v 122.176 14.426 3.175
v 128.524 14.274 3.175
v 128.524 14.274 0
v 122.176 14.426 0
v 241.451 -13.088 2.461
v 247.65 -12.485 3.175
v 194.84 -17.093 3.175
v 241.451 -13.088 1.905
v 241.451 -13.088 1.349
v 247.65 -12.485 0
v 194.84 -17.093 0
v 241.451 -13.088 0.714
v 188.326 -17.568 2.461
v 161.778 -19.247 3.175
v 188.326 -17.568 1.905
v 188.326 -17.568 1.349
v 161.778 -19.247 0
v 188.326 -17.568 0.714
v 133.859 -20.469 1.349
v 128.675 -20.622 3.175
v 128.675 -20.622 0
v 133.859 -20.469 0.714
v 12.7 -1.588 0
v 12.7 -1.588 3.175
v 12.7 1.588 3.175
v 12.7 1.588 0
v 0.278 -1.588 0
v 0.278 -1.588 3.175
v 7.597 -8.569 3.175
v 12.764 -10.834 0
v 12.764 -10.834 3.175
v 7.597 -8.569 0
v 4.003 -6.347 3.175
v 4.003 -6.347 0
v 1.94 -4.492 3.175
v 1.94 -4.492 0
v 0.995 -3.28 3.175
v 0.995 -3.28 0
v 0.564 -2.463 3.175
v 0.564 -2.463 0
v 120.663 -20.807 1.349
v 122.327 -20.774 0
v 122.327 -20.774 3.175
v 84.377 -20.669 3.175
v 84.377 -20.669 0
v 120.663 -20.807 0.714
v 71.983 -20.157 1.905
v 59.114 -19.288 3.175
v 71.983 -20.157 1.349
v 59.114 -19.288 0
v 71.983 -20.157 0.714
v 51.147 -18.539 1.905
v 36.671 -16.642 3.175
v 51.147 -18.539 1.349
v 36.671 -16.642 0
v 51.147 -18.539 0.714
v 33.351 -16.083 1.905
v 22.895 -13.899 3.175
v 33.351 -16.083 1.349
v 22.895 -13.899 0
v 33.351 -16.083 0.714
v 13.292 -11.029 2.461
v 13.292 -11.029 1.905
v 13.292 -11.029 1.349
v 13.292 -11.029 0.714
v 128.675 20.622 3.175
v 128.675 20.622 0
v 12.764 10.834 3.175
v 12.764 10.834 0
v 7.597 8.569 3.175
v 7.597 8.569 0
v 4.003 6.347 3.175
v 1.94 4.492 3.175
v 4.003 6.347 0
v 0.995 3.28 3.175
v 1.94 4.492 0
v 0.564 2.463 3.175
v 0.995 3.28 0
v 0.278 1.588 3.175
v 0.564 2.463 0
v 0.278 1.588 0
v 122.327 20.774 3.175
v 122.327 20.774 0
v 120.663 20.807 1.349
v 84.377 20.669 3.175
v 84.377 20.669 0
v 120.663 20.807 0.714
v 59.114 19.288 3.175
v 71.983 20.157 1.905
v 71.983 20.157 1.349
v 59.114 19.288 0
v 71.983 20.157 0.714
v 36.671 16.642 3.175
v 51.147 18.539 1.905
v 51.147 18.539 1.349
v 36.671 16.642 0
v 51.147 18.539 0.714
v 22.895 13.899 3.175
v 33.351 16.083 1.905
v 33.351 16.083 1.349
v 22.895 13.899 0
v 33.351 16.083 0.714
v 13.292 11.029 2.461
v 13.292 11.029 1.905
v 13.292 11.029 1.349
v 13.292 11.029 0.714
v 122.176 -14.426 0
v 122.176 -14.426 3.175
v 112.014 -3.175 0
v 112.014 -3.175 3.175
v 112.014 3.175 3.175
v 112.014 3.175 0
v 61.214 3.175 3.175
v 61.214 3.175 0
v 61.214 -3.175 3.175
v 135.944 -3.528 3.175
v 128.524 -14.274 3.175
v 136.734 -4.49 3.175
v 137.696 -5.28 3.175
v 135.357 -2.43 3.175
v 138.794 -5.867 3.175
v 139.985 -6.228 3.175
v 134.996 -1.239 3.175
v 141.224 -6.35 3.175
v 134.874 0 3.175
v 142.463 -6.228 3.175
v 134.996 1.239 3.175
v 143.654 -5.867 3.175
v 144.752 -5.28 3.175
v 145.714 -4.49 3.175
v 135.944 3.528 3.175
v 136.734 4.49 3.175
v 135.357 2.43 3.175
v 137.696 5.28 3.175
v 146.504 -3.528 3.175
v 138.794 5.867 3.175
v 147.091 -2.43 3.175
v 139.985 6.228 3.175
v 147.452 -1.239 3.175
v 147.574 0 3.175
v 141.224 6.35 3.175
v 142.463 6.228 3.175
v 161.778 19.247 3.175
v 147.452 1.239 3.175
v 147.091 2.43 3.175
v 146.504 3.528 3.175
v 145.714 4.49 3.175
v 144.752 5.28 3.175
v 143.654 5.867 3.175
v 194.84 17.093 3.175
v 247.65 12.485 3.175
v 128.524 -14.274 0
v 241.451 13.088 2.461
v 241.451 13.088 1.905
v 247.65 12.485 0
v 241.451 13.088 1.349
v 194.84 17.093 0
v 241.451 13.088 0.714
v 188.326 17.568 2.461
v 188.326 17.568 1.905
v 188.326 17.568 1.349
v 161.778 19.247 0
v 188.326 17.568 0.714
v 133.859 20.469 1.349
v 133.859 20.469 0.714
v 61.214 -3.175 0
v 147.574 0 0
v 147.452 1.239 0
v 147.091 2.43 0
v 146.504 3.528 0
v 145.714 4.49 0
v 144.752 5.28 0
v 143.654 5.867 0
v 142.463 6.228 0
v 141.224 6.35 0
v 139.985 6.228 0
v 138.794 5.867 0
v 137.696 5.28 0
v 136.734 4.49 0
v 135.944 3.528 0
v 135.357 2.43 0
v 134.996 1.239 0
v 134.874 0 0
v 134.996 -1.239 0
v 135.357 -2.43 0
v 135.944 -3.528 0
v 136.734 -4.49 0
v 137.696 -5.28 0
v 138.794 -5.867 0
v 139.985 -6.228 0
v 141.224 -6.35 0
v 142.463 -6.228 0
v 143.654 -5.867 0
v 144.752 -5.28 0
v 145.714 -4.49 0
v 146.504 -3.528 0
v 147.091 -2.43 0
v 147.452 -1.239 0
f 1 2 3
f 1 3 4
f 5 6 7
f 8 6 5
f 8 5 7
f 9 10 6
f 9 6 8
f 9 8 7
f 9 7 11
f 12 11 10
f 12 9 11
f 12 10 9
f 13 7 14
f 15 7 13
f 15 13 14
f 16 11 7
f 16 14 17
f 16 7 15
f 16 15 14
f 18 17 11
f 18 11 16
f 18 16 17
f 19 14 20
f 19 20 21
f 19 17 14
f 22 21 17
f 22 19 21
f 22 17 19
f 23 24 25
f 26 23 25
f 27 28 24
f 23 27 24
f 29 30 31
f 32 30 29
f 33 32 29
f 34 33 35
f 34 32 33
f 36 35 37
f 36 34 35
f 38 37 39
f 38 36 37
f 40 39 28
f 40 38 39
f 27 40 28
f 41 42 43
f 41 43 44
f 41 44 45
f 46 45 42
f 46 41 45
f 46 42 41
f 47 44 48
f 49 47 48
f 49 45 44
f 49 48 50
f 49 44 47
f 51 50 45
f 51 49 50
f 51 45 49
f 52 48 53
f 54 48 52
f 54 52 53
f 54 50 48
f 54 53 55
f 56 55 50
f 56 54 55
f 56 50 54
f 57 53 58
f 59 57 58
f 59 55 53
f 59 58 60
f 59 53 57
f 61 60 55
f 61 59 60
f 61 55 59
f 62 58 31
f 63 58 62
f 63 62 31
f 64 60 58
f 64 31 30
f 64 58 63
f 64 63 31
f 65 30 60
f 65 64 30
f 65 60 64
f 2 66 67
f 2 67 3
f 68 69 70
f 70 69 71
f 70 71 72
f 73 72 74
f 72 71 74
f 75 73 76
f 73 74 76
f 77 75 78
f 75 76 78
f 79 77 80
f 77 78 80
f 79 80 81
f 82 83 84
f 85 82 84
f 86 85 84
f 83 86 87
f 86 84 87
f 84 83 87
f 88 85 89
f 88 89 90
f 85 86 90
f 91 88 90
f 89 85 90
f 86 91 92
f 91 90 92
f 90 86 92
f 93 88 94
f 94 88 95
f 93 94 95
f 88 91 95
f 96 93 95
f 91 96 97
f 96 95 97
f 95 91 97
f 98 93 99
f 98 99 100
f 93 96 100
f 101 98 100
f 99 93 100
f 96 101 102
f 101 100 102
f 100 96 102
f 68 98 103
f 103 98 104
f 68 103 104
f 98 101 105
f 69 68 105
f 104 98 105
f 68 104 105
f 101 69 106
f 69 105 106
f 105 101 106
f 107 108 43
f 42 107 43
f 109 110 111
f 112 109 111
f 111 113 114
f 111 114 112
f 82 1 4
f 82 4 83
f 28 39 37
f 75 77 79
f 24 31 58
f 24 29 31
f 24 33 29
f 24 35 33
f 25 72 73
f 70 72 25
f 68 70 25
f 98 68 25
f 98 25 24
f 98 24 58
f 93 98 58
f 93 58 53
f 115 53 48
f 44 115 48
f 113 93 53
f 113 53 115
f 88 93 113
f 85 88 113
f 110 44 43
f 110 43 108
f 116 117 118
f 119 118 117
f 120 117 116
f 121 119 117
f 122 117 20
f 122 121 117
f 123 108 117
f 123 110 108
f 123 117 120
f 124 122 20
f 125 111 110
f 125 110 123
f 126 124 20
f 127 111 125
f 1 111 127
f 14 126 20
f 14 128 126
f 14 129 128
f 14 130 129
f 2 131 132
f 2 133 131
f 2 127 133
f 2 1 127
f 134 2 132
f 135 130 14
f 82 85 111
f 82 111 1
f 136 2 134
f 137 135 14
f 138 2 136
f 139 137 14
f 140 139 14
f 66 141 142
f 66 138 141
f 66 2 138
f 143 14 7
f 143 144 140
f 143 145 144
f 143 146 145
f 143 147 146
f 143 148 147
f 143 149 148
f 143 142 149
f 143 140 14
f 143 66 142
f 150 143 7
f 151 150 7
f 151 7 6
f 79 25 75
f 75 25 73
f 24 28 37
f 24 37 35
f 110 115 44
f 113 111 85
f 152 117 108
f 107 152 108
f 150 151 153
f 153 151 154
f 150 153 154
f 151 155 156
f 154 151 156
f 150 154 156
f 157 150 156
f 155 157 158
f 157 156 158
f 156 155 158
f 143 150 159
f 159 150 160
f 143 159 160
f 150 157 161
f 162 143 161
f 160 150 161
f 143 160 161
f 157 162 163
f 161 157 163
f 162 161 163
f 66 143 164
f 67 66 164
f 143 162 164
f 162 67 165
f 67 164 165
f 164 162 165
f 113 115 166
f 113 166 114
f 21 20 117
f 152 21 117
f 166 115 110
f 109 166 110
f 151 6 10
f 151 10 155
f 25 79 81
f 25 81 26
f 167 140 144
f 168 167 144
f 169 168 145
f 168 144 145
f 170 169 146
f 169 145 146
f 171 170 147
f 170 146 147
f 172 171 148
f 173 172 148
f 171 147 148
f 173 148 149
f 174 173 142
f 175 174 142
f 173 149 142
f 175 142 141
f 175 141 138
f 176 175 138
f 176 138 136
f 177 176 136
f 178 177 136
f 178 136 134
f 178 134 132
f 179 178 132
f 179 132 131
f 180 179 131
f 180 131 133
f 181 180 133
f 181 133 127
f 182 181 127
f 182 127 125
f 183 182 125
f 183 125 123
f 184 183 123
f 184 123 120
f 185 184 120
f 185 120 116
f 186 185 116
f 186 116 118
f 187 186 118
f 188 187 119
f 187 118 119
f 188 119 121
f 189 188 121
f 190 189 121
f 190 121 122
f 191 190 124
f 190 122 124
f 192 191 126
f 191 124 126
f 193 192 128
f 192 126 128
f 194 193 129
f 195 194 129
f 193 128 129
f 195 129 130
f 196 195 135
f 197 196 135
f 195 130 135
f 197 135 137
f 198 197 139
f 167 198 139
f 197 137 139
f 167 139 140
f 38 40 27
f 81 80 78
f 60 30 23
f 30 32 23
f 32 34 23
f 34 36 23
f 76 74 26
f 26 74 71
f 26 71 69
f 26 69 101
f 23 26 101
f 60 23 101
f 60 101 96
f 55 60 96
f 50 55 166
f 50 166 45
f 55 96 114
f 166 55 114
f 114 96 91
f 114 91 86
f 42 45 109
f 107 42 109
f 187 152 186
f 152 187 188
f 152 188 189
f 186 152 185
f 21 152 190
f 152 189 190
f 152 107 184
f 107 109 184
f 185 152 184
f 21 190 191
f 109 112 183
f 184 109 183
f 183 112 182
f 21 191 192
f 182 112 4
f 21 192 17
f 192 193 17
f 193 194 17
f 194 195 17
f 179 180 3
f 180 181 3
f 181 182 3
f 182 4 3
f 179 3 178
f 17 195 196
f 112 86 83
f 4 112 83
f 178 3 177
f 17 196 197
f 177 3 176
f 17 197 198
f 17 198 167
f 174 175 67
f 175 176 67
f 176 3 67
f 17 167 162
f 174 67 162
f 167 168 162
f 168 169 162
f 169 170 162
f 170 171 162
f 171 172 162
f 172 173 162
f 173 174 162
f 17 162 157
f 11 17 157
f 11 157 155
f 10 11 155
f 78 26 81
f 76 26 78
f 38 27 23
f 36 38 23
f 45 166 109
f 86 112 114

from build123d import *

# Parameters (mm, degrees)
BOSS_EXTRUDE1_DEPTH = 3.175
SKETCH3_R           = 6.35
SKETCH3_W           = 101.6
SKETCH3_H           = 101.6
SKETCH3_W_2         = 12.7
SKETCH3_H_2         = 3.175
CUT_EXTRUDE1_DEPTH  = 5.08
SKETCH4_W           = 50.8
SKETCH4_H           = 6.35
CUT_EXTRUDE2_DEPTH  = 5.08


with BuildPart() as part:
    # Sketch2 → Boss-Extrude1 (new body)
    with BuildSketch(Plane.XY):
        with BuildLine():
            add(Edge.make_bspline(
                [(349.25, 0), (349.081845346, 0.195028946), (348.546486748, 0.815947966), (346.670763268, 0.635287815), (344.11086643, 1.231330826), (340.348873806, 1.640765335), (335.631665172, 2.319189902), (329.896669995, 3.064968776), (323.213152208, 3.937751592), (315.610665982, 4.899637326), (307.139892382, 5.94572983), (297.851820227, 7.058039906), (287.804163994, 8.223966301), (277.05860736, 9.42727111), (265.681494766, 10.653371923), (253.743033604, 11.887008331), (241.316804275, 13.11226643), (228.479451099, 14.31194461), (215.310032455, 15.470294327), (201.889886046, 16.567949836), (188.301472832, 17.587013879), (174.628693344, 18.508566703), (160.95579103, 19.313339436), (147.366939387, 19.981000511), (133.946062727, 20.493746123), (120.775518049, 20.834848585), (107.936696619, 20.987647162), (95.508487727, 20.940015693), (83.567514363, 20.682753776), (72.187279219, 20.209340103), (61.437827927, 19.518536296), (51.385233466, 18.612420938), (42.090988888, 17.498070831), (33.611817078, 16.184967443), (25.998868366, 14.686825017), (19.297496021, 13.02058345), (13.543519177, 11.202490675), (8.772941595, 9.249479701), (4.98137124, 7.174763565), (2.229693173, 4.974247418), (0.364862544, 2.594695774), (0.115985535, 0.824823436), (0, 0)],
                knots=[0, 0, 0, 0, 0.002091853, 0.006659889, 0.014240034, 0.024784942, 0.038226646, 0.054481348, 0.073444809, 0.094998776, 0.11900639, 0.145318898, 0.173770288, 0.204183654, 0.236370679, 0.270129473, 0.305250351, 0.341516861, 0.378701149, 0.416575318, 0.454902219, 0.493447217, 0.531971459, 0.57023708, 0.608012632, 0.645066312, 0.681178002, 0.716129843, 0.74971807, 0.781748295, 0.812036536, 0.840415327, 0.866732056, 0.890849065, 0.912651845, 0.932046273, 0.94897292, 0.963413199, 0.975421325, 0.985175212, 0.993091122, 1, 1, 1, 1], degree=3))
            add(Edge.make_bspline(
                [(349.25, 0), (349.081845346, -0.195028946), (348.546486748, -0.815947966), (346.670763268, -0.635287815), (344.11086643, -1.231330826), (340.348873806, -1.640765335), (335.631665172, -2.319189902), (329.896669995, -3.064968776), (323.213152208, -3.937751592), (315.610665982, -4.899637326), (307.139892382, -5.94572983), (297.851820227, -7.058039906), (287.804163994, -8.223966301), (277.05860736, -9.42727111), (265.681494766, -10.653371923), (253.743033604, -11.887008331), (241.316804275, -13.11226643), (228.479451099, -14.31194461), (215.310032455, -15.470294327), (201.889886046, -16.567949836), (188.301472832, -17.587013879), (174.628693344, -18.508566703), (160.95579103, -19.313339436), (147.366939387, -19.981000511), (133.946062727, -20.493746123), (120.775518049, -20.834848585), (107.936696619, -20.987647162), (95.508487727, -20.940015693), (83.567514363, -20.682753776), (72.187279219, -20.209340103), (61.437827927, -19.518536296), (51.385233466, -18.612420938), (42.090988888, -17.498070831), (33.611817078, -16.184967443), (25.998868366, -14.686825017), (19.297496021, -13.02058345), (13.543519177, -11.202490675), (8.772941595, -9.249479701), (4.98137124, -7.174763565), (2.229693173, -4.974247418), (0.364862544, -2.594695774), (0.115985535, -0.824823436), (0, 0)],
                knots=[0, 0, 0, 0, 0.002091853, 0.006659889, 0.014240034, 0.024784942, 0.038226646, 0.054481348, 0.073444809, 0.094998776, 0.11900639, 0.145318898, 0.173770288, 0.204183654, 0.236370679, 0.270129473, 0.305250351, 0.341516861, 0.378701149, 0.416575318, 0.454902219, 0.493447217, 0.531971459, 0.57023708, 0.608012632, 0.645066312, 0.681178002, 0.716129843, 0.74971807, 0.781748295, 0.812036536, 0.840415327, 0.866732056, 0.890849065, 0.912651845, 0.932046273, 0.94897292, 0.963413199, 0.975421325, 0.985175212, 0.993091122, 1, 1, 1, 1], degree=3))
        make_face()
    extrude(amount=BOSS_EXTRUDE1_DEPTH)

    # Sketch3 → Cut-Extrude1 (cut)
    with BuildSketch(Plane.XY.offset(3.175)):
        with Locations((141.224, 0)):
            Circle(SKETCH3_R)
        with Locations((298.45, 0)):
            Rectangle(SKETCH3_W, SKETCH3_H)
        with Locations((6.35, 0)):
            Rectangle(SKETCH3_W_2, SKETCH3_H_2)
        Polygon((128.675427045, -20.622361952), (128.524, -14.274167732), (122.17580578, -14.425594777), (122.327232825, -20.773788997), (122.630086914, -33.470177436), (128.978281134, -33.318750391), align=None)
        Polygon((128.524, 14.274167732), (122.17580578, 14.425594777), (122.327232825, 20.773788997), (122.552222293, 30.205900992), (128.900416513, 30.054473947), (128.675427045, 20.622361952), align=None)
    extrude(amount=-CUT_EXTRUDE1_DEPTH, mode=Mode.SUBTRACT)

    # Sketch4 → Cut-Extrude2 (cut)
    with BuildSketch(Plane.XY.offset(3.175)):
        with Locations((86.614, 0)):
            Rectangle(SKETCH4_W, SKETCH4_H)
    extrude(amount=-CUT_EXTRUDE2_DEPTH, mode=Mode.SUBTRACT)


solid = part.part
